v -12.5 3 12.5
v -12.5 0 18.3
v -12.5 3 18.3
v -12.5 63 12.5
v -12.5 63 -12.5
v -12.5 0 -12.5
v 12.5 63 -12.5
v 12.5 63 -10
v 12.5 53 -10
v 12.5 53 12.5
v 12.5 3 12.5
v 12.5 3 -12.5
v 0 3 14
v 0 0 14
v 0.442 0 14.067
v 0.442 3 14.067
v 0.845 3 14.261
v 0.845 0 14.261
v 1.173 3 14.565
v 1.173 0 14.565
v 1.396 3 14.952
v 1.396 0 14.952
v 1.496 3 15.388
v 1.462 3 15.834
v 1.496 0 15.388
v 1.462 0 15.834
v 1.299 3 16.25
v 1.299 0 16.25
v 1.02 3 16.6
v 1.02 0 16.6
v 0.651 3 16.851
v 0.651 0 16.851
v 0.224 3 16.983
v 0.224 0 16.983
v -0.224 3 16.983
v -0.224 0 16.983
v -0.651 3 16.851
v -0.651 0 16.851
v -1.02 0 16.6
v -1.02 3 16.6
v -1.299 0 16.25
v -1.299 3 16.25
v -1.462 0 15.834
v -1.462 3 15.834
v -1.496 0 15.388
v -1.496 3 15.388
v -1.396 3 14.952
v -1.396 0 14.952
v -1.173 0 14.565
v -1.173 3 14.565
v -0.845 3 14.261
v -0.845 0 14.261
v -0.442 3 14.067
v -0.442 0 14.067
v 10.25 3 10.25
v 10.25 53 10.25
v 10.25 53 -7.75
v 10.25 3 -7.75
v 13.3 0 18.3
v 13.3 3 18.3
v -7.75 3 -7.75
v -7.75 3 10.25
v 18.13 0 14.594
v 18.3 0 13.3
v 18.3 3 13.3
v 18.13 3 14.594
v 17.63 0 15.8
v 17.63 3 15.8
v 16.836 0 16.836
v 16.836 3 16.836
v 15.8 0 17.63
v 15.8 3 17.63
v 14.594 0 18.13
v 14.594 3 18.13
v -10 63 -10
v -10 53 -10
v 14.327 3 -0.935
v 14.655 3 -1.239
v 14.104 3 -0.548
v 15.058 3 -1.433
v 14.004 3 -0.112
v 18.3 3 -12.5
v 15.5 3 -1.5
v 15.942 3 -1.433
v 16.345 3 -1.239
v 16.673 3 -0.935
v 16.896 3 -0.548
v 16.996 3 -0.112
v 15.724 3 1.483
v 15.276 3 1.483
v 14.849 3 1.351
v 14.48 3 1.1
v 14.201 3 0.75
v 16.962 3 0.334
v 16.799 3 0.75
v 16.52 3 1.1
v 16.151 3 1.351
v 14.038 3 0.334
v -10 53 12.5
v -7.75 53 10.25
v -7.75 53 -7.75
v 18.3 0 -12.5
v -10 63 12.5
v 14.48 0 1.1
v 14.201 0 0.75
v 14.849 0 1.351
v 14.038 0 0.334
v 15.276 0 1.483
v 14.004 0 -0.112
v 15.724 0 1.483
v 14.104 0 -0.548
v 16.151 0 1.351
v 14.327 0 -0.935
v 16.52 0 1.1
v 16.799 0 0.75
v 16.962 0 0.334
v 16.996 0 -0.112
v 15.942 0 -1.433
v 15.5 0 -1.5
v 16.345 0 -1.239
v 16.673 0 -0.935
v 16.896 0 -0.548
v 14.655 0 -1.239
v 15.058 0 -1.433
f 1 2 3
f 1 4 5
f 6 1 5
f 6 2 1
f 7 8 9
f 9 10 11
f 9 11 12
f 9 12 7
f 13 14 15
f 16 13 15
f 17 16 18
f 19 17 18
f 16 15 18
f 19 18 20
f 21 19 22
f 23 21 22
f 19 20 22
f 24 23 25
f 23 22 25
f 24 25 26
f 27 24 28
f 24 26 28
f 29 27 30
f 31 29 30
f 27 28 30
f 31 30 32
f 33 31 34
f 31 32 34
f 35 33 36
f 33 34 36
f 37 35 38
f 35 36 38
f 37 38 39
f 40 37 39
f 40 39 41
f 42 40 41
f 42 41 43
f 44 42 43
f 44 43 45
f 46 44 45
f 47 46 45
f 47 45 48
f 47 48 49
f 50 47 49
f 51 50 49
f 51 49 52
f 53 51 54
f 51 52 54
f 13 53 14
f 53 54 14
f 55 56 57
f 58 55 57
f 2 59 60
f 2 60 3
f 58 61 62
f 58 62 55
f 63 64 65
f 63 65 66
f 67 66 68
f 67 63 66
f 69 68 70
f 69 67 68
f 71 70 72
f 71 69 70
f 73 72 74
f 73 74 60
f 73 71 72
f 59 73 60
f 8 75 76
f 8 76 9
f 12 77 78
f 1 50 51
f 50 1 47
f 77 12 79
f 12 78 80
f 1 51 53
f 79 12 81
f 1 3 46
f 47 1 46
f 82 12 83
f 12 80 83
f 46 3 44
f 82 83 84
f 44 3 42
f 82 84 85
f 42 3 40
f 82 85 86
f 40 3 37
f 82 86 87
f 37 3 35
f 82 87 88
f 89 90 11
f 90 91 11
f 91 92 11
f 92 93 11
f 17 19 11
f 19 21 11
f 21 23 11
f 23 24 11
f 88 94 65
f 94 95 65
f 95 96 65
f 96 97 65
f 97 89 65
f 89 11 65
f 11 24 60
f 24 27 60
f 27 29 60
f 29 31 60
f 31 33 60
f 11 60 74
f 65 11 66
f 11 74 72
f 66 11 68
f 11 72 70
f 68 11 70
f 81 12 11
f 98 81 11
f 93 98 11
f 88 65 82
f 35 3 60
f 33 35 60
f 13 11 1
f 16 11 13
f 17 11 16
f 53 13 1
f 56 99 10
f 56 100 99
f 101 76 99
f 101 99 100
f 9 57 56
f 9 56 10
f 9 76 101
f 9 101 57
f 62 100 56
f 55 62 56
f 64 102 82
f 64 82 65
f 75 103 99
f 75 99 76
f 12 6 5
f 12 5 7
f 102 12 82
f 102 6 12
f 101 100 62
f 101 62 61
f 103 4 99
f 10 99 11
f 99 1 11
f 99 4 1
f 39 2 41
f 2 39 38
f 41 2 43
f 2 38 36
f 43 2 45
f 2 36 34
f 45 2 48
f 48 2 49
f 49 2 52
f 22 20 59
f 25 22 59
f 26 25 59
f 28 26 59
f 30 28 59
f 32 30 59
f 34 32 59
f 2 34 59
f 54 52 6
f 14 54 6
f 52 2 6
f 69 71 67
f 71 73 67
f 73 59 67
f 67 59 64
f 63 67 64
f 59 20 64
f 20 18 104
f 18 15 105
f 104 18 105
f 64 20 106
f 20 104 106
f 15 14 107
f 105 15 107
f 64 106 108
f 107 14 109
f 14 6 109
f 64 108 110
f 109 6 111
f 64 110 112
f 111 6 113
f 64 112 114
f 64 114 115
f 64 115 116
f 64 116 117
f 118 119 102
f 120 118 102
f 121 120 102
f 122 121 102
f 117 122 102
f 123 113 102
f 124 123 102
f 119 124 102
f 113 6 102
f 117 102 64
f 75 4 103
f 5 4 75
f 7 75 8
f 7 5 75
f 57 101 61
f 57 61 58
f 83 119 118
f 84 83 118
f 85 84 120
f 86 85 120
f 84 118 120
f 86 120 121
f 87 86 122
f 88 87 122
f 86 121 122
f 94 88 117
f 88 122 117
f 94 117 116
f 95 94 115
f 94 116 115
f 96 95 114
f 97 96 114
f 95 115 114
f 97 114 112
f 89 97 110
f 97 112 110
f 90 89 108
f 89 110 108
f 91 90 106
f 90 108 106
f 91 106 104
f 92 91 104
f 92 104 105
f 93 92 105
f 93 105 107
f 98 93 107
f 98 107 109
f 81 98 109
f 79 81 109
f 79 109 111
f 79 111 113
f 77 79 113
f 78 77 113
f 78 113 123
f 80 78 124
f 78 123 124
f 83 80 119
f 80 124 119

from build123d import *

# Parameters (mm, degrees)
SKETCH1_W           = 25
SKETCH1_H           = 25
BOSS_EXTRUDE1_DEPTH = 63
SKETCH2_W           = 22.5
SKETCH2_H           = 22.5
CUT_EXTRUDE2_DEPTH  = 10
SKETCH4_W           = 25
SKETCH4_H           = 25
SKETCH4_R           = 1.5
BOSS_EXTRUDE2_DEPTH = 3
SKETCH5_W           = 18
SKETCH5_H           = 18
CUT_EXTRUDE3_DEPTH  = 50


with BuildPart() as part:
    # Sketch1 → Boss-Extrude1 (new body)
    with BuildSketch(Plane(origin=(0, 0, 0), x_dir=(1, 0, 0), z_dir=(0, 1, 0))):
        Rectangle(SKETCH1_W, SKETCH1_H)
    extrude(amount=BOSS_EXTRUDE1_DEPTH)

    # Sketch2 → Cut-Extrude2 (cut)
    with BuildSketch(Plane(origin=(0, 63, 0), x_dir=(1, 0, 0), z_dir=(0, 1, 0))):
        with Locations((1.25, -1.25)):
            Rectangle(SKETCH2_W, SKETCH2_H)
    extrude(amount=-CUT_EXTRUDE2_DEPTH, mode=Mode.SUBTRACT)

    # Sketch4 → Boss-Extrude2 (add)
    # profile 1 of 2: a face of its own
    with BuildSketch(Plane.XZ):
        Rectangle(SKETCH4_W, SKETCH4_H)
    # profile 2 of 2: a face of its own
    with BuildSketch(Plane.XZ):
        with BuildLine():
            Line((12.5, 12.5), (12.5, -12.5))
            Line((12.5, -12.5), (18.3, -12.5))
            Line((18.3, -12.5), (18.3, 13.3))
            ThreePointArc((18.3, 13.3), (16.835533906, 16.835533906), (13.3, 18.3))
            Line((13.3, 18.3), (-12.5, 18.3))
            Line((-12.5, 18.3), (-12.5, 12.5))
            Line((-12.5, 12.5), (12.5, 12.5))
        make_face()
        with Locations(Location((15.5, 0, 0), (0, 0, 270))):
            Circle(SKETCH4_R, mode=Mode.SUBTRACT)
        with Locations(Location((0, 15.5, 0), (0, 0, 270))):
            Circle(SKETCH4_R, mode=Mode.SUBTRACT)
    extrude(amount=-BOSS_EXTRUDE2_DEPTH)

    # Sketch5 → Cut-Extrude3 (cut)
    with BuildSketch(Plane(origin=(0, 53, 0), x_dir=(1, 0, 0), z_dir=(0, 1, 0))):
        with Locations((1.25, -1.25)):
            Rectangle(SKETCH5_W, SKETCH5_H)
    extrude(amount=-CUT_EXTRUDE3_DEPTH, mode=Mode.SUBTRACT)


solid = part.part
